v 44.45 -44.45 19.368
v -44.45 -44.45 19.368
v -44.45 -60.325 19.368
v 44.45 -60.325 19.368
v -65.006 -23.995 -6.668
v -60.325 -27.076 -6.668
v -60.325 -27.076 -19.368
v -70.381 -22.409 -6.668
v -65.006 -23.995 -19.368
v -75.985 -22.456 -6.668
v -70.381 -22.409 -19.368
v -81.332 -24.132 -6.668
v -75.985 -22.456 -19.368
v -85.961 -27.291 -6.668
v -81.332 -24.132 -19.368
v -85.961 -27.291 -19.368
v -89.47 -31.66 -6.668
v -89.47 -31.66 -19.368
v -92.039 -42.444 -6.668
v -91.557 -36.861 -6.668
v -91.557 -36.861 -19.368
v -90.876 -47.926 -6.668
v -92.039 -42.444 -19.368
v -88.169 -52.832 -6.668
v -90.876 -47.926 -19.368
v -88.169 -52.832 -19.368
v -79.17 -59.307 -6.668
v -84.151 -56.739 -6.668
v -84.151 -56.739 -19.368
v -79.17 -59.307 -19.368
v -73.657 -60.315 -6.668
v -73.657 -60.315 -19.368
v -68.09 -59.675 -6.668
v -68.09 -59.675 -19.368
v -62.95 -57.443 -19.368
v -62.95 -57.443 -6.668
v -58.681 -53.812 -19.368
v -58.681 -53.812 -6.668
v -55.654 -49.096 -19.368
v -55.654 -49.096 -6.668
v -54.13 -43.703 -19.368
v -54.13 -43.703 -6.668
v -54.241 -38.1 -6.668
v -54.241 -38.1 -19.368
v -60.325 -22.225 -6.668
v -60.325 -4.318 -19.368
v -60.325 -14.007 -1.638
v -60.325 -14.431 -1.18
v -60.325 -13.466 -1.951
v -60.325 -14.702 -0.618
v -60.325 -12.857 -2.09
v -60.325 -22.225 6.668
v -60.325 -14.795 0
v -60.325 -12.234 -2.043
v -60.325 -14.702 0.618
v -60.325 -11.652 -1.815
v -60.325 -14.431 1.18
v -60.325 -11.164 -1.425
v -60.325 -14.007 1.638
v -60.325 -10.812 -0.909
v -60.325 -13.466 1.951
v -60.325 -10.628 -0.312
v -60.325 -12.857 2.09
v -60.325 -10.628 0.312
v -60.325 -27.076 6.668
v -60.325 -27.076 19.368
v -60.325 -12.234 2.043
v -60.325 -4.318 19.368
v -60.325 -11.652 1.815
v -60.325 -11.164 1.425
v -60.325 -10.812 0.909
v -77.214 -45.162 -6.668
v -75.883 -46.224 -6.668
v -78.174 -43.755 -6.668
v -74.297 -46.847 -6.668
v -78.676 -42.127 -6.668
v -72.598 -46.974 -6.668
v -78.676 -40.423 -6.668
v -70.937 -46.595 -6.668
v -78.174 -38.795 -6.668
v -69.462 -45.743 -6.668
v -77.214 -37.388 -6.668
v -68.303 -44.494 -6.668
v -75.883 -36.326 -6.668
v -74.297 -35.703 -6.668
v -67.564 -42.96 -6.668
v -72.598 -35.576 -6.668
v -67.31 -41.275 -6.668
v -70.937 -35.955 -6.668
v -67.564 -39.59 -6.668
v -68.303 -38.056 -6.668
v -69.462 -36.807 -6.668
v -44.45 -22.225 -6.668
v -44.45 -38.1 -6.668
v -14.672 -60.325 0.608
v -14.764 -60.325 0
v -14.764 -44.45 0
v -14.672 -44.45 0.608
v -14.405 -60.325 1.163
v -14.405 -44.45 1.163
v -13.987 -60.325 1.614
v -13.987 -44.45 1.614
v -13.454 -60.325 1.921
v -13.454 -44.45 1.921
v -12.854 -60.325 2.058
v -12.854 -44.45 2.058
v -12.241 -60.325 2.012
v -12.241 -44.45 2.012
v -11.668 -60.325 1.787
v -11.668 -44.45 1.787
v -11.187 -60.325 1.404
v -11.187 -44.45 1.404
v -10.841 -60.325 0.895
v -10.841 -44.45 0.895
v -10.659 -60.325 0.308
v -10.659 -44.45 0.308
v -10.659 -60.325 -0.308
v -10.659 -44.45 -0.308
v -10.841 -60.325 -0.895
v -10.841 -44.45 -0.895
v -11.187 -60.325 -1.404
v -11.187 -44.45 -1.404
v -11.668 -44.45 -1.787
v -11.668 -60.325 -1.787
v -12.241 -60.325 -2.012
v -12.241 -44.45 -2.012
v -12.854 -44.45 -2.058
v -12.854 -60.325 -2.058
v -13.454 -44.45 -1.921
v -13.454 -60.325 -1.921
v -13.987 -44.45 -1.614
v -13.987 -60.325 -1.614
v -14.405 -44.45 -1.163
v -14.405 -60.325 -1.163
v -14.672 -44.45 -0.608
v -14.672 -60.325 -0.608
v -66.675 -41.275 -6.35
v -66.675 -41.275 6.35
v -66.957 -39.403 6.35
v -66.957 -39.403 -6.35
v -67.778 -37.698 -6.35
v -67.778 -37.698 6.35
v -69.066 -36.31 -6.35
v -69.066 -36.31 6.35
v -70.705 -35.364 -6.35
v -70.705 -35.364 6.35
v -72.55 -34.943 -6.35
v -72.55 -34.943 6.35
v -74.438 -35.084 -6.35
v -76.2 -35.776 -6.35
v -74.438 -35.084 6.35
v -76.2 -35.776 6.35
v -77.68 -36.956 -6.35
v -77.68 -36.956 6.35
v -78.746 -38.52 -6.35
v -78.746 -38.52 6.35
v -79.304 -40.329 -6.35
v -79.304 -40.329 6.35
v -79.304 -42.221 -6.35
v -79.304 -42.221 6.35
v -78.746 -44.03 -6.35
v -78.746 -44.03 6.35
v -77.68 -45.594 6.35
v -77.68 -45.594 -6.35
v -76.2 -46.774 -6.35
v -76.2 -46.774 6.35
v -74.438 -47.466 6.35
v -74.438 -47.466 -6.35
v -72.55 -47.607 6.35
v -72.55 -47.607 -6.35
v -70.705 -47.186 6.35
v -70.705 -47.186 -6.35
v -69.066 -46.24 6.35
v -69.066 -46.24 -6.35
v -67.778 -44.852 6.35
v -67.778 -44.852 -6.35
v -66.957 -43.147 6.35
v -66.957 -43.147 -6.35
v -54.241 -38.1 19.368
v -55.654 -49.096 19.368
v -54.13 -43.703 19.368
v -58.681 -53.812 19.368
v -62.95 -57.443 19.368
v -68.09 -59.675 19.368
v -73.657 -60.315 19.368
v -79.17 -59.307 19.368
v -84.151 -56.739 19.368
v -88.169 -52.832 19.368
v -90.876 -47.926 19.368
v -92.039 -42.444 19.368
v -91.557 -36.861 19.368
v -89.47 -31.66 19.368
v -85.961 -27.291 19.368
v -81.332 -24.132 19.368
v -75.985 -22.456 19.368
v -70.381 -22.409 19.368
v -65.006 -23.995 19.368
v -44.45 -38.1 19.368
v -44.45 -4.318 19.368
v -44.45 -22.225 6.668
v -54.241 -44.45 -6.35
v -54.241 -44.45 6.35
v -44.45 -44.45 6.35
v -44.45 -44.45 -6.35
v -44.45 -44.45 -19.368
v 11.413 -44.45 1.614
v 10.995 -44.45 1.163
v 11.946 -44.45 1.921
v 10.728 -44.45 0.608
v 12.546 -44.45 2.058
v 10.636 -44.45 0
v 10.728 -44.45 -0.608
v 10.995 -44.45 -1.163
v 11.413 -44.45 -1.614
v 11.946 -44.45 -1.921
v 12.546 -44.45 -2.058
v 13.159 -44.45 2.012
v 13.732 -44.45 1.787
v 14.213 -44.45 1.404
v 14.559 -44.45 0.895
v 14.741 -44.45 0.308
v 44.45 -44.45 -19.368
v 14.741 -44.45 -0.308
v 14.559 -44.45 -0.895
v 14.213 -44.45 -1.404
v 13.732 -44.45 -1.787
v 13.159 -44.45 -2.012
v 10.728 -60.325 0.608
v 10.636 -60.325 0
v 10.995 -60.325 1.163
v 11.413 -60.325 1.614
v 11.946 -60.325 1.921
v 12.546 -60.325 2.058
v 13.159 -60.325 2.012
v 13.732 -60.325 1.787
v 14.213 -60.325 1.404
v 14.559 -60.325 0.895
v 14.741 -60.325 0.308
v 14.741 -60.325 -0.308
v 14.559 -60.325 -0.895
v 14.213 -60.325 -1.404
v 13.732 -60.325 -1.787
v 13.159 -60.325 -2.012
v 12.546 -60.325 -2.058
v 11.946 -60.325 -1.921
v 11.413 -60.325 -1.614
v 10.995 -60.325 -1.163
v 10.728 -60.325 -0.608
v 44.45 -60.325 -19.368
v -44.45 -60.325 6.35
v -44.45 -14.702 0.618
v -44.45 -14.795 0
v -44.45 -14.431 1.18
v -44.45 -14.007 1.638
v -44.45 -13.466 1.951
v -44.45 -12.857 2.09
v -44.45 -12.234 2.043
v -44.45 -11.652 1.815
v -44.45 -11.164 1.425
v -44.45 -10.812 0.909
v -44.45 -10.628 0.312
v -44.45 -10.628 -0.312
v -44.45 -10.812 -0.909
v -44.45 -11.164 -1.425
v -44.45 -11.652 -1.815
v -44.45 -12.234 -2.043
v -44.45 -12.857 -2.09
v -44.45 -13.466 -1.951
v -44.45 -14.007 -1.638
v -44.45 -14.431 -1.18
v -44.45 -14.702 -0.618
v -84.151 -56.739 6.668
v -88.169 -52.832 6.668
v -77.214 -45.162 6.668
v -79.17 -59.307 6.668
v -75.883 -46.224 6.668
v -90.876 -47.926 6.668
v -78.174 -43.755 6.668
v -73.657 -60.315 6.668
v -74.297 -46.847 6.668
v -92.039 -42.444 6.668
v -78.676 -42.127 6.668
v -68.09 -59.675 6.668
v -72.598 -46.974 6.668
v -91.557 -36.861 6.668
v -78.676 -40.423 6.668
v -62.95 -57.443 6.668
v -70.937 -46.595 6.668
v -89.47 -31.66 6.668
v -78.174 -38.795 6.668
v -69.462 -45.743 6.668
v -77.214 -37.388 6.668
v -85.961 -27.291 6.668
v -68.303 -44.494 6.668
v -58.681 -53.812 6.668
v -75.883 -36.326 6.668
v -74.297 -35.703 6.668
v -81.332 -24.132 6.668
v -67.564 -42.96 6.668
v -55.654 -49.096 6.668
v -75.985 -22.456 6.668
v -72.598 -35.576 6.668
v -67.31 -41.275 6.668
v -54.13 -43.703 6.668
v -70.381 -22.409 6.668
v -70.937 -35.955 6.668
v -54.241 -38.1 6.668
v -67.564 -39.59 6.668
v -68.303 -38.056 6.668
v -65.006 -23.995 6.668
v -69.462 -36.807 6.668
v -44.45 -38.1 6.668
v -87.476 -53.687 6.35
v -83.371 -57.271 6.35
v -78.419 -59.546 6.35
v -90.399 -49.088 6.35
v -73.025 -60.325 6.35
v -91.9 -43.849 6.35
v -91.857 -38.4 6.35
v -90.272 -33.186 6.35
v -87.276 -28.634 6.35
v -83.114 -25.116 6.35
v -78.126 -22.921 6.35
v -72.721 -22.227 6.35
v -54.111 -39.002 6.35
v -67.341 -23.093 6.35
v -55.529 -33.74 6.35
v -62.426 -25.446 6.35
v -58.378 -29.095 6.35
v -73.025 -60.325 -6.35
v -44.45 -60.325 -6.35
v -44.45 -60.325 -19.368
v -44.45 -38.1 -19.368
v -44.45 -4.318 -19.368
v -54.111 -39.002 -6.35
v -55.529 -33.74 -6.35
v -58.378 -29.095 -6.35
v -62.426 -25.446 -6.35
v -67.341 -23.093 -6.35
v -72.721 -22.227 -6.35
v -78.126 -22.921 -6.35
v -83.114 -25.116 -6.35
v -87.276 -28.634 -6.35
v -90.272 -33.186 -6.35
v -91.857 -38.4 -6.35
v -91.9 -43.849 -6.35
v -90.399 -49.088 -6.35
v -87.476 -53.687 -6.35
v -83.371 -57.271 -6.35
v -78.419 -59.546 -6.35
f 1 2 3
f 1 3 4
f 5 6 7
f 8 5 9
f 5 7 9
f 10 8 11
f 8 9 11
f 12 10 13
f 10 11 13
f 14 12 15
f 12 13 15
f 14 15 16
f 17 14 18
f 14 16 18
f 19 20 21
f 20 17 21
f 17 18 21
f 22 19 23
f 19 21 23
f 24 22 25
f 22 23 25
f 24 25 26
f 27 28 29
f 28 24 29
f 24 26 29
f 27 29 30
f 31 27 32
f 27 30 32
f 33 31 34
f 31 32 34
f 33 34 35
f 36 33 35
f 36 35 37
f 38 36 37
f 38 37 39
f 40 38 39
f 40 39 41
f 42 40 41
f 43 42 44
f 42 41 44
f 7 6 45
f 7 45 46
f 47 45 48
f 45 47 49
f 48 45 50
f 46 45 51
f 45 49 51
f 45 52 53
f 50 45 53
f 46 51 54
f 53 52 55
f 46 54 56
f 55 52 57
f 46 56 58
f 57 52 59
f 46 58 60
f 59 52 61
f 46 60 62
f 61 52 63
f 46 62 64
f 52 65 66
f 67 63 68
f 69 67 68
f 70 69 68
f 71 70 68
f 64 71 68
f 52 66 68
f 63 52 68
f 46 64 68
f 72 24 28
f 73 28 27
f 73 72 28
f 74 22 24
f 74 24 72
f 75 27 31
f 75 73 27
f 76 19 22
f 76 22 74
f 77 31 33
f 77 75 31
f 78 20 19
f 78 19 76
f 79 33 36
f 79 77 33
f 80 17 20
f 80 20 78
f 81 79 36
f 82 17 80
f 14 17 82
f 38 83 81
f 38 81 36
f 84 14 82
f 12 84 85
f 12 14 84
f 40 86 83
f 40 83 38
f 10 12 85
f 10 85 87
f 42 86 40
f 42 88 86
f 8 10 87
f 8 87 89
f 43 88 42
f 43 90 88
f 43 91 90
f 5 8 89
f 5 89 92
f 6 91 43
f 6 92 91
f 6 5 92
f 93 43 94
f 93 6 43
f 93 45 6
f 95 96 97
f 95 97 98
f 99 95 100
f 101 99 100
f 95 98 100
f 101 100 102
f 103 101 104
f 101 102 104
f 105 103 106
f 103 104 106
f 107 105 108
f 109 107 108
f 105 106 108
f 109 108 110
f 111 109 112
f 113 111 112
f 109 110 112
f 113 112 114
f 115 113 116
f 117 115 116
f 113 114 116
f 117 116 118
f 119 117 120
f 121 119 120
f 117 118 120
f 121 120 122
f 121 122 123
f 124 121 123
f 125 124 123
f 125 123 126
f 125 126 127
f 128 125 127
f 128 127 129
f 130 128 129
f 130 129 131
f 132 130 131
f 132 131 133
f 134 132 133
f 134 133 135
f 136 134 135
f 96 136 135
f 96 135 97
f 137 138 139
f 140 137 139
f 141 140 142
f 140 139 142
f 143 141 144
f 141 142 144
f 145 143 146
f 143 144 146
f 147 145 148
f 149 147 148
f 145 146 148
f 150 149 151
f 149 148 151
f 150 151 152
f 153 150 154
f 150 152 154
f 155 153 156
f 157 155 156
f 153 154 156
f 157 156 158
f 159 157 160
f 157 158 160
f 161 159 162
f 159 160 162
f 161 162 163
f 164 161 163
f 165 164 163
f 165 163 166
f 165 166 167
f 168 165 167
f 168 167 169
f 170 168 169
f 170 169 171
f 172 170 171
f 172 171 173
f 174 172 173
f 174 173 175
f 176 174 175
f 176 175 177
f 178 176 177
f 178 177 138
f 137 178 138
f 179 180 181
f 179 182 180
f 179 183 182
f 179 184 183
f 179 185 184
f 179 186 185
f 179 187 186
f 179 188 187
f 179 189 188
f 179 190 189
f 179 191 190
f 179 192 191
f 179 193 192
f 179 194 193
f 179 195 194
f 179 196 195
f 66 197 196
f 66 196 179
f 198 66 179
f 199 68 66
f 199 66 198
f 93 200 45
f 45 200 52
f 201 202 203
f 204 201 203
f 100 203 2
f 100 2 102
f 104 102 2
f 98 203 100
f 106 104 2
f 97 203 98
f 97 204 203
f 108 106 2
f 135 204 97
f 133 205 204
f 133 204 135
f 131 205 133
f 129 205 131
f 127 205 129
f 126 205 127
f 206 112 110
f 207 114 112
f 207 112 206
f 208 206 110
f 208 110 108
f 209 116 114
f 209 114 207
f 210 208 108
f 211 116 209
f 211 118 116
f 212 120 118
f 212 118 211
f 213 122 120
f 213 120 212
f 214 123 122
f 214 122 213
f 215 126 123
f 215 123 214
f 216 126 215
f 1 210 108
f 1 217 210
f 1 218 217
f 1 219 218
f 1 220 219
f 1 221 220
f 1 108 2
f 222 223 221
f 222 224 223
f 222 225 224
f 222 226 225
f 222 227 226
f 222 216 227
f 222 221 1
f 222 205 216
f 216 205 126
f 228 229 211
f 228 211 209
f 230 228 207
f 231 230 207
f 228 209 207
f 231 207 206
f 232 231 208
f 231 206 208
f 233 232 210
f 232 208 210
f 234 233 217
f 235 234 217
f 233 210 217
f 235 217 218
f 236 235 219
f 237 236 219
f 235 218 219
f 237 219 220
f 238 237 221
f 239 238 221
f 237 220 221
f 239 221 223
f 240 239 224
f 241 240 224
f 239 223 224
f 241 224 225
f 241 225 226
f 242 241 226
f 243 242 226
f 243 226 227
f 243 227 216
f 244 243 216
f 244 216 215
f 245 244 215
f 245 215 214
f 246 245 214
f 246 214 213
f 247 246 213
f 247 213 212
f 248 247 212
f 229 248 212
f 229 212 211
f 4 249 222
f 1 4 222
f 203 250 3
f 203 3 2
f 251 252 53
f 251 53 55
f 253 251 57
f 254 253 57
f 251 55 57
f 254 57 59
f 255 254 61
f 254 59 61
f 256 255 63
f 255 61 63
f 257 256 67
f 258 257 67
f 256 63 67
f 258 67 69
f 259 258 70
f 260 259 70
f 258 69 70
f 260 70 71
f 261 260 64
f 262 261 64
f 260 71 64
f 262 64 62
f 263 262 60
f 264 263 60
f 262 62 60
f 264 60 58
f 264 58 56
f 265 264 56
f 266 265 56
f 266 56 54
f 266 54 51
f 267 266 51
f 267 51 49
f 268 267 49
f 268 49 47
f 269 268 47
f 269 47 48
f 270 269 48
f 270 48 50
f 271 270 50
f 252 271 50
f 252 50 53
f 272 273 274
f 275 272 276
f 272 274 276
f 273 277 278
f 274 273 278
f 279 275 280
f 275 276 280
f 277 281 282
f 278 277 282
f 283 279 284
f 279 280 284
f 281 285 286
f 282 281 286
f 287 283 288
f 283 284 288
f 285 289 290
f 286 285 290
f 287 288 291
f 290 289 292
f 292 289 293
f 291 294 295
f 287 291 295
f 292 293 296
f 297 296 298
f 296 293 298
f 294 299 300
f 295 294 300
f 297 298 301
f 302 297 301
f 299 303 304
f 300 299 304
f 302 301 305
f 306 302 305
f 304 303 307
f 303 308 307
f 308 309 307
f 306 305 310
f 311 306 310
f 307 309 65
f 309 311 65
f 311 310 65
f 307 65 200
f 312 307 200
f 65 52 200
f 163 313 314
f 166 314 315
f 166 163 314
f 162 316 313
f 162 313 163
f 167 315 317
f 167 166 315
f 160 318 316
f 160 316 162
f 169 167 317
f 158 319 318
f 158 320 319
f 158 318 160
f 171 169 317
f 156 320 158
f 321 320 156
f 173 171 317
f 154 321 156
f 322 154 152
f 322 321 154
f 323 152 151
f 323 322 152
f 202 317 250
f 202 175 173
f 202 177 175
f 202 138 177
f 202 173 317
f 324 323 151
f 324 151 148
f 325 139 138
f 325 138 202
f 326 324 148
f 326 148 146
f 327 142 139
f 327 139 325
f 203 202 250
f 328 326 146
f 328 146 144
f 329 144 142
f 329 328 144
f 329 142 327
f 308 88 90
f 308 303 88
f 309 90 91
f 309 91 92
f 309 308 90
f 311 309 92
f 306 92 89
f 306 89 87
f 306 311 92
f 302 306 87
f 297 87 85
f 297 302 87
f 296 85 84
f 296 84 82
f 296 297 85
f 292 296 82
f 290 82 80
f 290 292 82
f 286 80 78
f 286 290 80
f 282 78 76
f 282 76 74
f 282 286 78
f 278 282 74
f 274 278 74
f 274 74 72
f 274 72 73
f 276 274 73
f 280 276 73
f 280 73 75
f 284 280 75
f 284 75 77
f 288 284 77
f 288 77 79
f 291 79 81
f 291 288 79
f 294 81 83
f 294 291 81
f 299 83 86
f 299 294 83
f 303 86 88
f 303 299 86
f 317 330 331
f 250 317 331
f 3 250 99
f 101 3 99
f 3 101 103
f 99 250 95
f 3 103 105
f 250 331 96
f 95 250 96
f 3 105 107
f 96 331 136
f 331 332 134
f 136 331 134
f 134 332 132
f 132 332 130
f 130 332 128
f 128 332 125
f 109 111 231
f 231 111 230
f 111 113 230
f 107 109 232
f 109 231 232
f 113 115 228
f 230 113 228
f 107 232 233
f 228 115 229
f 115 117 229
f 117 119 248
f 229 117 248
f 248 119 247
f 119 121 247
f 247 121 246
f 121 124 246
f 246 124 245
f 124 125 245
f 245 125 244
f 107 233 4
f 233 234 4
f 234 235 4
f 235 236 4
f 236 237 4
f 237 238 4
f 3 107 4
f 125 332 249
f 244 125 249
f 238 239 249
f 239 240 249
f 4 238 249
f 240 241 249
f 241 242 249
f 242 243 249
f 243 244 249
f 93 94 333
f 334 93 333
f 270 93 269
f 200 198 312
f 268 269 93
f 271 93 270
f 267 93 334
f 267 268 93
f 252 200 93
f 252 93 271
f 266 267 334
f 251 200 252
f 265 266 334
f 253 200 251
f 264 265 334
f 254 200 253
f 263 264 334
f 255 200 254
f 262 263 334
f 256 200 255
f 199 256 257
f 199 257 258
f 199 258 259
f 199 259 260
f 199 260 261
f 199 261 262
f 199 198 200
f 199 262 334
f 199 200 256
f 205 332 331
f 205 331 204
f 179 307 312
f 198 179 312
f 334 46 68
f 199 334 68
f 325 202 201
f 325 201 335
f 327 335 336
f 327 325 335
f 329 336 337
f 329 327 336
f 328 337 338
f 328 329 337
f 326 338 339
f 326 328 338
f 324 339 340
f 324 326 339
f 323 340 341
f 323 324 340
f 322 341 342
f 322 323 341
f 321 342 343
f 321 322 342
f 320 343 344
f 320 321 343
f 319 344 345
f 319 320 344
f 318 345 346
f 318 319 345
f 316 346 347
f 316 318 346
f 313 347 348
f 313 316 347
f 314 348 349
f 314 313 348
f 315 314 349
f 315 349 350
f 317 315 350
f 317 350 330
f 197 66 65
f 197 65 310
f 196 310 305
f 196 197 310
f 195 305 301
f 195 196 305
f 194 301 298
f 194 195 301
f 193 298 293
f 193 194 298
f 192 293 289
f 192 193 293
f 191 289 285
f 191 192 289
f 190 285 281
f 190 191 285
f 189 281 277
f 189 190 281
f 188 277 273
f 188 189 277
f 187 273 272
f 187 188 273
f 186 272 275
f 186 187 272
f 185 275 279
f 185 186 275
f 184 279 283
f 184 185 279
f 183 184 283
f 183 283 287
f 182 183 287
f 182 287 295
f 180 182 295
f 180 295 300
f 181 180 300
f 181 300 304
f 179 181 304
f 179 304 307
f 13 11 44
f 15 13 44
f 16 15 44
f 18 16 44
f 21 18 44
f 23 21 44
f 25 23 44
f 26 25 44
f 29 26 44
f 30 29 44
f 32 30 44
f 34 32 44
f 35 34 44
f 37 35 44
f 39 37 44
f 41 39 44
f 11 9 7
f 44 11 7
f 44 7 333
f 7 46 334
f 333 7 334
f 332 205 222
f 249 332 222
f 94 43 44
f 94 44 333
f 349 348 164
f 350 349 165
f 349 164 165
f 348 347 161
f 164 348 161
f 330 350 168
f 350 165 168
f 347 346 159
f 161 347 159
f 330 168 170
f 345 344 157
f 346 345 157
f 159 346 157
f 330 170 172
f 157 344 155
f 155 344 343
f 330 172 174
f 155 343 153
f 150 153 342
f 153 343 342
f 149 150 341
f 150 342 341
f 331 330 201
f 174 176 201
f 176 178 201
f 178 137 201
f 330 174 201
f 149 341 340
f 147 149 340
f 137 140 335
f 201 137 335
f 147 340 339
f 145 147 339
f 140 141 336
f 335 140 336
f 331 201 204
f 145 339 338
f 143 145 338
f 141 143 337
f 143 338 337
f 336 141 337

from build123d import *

# Parameters (mm, degrees)
SKETCH1_R           = 19.05
BOSS_EXTRUDE1_DEPTH = 6.35
BOSS_EXTRUDE2_DEPTH = 12.7
SKETCH3_R           = 6.35
CUT_EXTRUDE1_DEPTH  = 111.807045128
SKETCH4_R           = 5.715
BOSS_EXTRUDE3_DEPTH = 6.6675
BOSS_EXTRUDE4_START = 12.7
SKETCH5_R           = 19.05
BOSS_EXTRUDE4_DEPTH = 12.7
BOSS_EXTRUDE5_DEPTH = 12.7
BOSS_EXTRUDE6_REACH = 115.114
SKETCH7_W           = 15.875
SKETCH7_H           = 60.325
BOSS_EXTRUDE7_START = -25.7175
SKETCH8_W           = 88.9
SKETCH8_H           = 15.875
BOSS_EXTRUDE7_DEPTH = 38.735
SKETCH16_R          = 2.0955
CUT_EXTRUDE8_DEPTH  = 123.441848672
SKETCH17_R          = 2.06375
CUT_EXTRUDE9_DEPTH  = 126.16951778
SKETCH20_W          = 38.735
SKETCH20_H          = 42.418
CUT_EXTRUDE13_DEPTH = 123.441848672


with BuildPart() as part:
    # Sketch1 → Boss-Extrude1 (new, symmetric)
    with BuildSketch(Plane.XY):
        with Locations((-73.025, -41.275)):
            Circle(SKETCH1_R)
    extrude(amount=BOSS_EXTRUDE1_DEPTH, both=True)

    # Sketch2 → Boss-Extrude2 (add)
    with BuildSketch(Plane.XY.offset(6.35)):
        with BuildLine():
            Line((-54.241446689, -44.45), (44.45, -44.45))
            Line((44.45, -44.45), (44.45, -60.325))
            Line((44.45, -60.325), (-73.025, -60.325))
            ThreePointArc((-73.025, -60.325), (-60.728277876, -55.824677831), (-54.241446689, -44.45))
        make_face()
    extrude(amount=-BOSS_EXTRUDE2_DEPTH)

    # Sketch3 → Cut-Extrude1 (cut, through all)
    with BuildSketch(Plane.XY.offset(6.35)):
        with Locations((-73.025, -41.275)):
            Circle(SKETCH3_R)
    extrude(amount=-CUT_EXTRUDE1_DEPTH, mode=Mode.SUBTRACT)

    # Sketch8 → Boss-Extrude7 (add)
    with BuildSketch(Plane.XY.offset(6.35).offset(BOSS_EXTRUDE7_START)):
        with Locations((0, -52.3875)):
            Rectangle(SKETCH8_W, SKETCH8_H)
    extrude(amount=BOSS_EXTRUDE7_DEPTH)

    # Sketch17 → Cut-Extrude9 (cut, through all)
    with BuildSketch(Plane(origin=(0, -44.45, 0), x_dir=(1, 0, 0), z_dir=(0, 1, 0))):
        with Locations(Location((-12.7, 0, 0), (0, 0, 180))):
            Circle(SKETCH17_R)
        with Locations(Location((12.7, 0, 0), (0, 0, 180))):
            Circle(SKETCH17_R)
    extrude(amount=-CUT_EXTRUDE9_DEPTH, mode=Mode.SUBTRACT)


with BuildPart() as body_2:
    # Sketch4 → Boss-Extrude3 (new, symmetric)
    with BuildSketch(Plane.XY):
        with Locations((-73.025, -41.275)):
            Circle(SKETCH4_R)
    extrude(amount=BOSS_EXTRUDE3_DEPTH, both=True)

    # Sketch5 → Boss-Extrude4 (add)
    with BuildSketch(Plane.XY.offset(6.6675).offset(BOSS_EXTRUDE4_START)):
        with Locations((-73.025, -41.275)):
            Circle(SKETCH5_R)
    boss_extrude4 = extrude(amount=-BOSS_EXTRUDE4_DEPTH)

    # Sketch6 → Boss-Extrude5 (add)
    with BuildSketch(Plane.XY.offset(19.3675)):
        with BuildLine():
            Line((-44.45, -38.1), (-44.45, 38.1))
            Line((-44.45, 38.1), (-60.325, 38.1))
            Line((-60.325, 38.1), (-60.325, -27.075968343))
            ThreePointArc((-60.325, -27.075968343), (-56.346095636, -32.070835224), (-54.241446689, -38.1))
            Line((-54.241446689, -38.1), (-44.45, -38.1))
        make_face()
    boss_extrude5 = extrude(amount=-BOSS_EXTRUDE5_DEPTH)

    # Mirror1: Boss-Extrude4, Boss-Extrude5 across plane
    add(boss_extrude4.mirror(Plane.XY))
    add(boss_extrude5.mirror(Plane.XY))

    # Sketch7 → Boss-Extrude6 (add, up to next)
    with BuildSketch(Plane(origin=(0, 0, 6.6675), x_dir=(-1, 0, 0), z_dir=(0, 0, -1)), mode=Mode.PRIVATE) as boss_extrude6_sk1:
        with Locations((52.3875, 7.9375)):
            Rectangle(SKETCH7_W, SKETCH7_H)
    boss_extrude6_tool1 = extrude(boss_extrude6_sk1.sketch, amount=BOSS_EXTRUDE6_REACH, mode=Mode.PRIVATE) - body_2.part
    add(boss_extrude6_tool1.solids().sort_by_distance((-52.3875, 7.9375, 6.6675))[0])

    # Sketch16 → Cut-Extrude8 (cut, through all)
    with BuildSketch(Plane.ZY.offset(60.325)):
        with Locations(Location((0, 12.7, 0), (0, 0, 270))):
            Circle(SKETCH16_R)
        with Locations(Location((0, -12.7, 0), (0, 0, 270))):
            Circle(SKETCH16_R)
    extrude(amount=-CUT_EXTRUDE8_DEPTH, mode=Mode.SUBTRACT)

    # Sketch20 → Cut-Extrude13 (cut, through all)
    with BuildSketch(Plane.ZY.offset(60.325)):
        with Locations((0, 16.891)):
            Rectangle(SKETCH20_W, SKETCH20_H)
    extrude(amount=-CUT_EXTRUDE13_DEPTH, mode=Mode.SUBTRACT)


solid = Compound([part.part, body_2.part])
